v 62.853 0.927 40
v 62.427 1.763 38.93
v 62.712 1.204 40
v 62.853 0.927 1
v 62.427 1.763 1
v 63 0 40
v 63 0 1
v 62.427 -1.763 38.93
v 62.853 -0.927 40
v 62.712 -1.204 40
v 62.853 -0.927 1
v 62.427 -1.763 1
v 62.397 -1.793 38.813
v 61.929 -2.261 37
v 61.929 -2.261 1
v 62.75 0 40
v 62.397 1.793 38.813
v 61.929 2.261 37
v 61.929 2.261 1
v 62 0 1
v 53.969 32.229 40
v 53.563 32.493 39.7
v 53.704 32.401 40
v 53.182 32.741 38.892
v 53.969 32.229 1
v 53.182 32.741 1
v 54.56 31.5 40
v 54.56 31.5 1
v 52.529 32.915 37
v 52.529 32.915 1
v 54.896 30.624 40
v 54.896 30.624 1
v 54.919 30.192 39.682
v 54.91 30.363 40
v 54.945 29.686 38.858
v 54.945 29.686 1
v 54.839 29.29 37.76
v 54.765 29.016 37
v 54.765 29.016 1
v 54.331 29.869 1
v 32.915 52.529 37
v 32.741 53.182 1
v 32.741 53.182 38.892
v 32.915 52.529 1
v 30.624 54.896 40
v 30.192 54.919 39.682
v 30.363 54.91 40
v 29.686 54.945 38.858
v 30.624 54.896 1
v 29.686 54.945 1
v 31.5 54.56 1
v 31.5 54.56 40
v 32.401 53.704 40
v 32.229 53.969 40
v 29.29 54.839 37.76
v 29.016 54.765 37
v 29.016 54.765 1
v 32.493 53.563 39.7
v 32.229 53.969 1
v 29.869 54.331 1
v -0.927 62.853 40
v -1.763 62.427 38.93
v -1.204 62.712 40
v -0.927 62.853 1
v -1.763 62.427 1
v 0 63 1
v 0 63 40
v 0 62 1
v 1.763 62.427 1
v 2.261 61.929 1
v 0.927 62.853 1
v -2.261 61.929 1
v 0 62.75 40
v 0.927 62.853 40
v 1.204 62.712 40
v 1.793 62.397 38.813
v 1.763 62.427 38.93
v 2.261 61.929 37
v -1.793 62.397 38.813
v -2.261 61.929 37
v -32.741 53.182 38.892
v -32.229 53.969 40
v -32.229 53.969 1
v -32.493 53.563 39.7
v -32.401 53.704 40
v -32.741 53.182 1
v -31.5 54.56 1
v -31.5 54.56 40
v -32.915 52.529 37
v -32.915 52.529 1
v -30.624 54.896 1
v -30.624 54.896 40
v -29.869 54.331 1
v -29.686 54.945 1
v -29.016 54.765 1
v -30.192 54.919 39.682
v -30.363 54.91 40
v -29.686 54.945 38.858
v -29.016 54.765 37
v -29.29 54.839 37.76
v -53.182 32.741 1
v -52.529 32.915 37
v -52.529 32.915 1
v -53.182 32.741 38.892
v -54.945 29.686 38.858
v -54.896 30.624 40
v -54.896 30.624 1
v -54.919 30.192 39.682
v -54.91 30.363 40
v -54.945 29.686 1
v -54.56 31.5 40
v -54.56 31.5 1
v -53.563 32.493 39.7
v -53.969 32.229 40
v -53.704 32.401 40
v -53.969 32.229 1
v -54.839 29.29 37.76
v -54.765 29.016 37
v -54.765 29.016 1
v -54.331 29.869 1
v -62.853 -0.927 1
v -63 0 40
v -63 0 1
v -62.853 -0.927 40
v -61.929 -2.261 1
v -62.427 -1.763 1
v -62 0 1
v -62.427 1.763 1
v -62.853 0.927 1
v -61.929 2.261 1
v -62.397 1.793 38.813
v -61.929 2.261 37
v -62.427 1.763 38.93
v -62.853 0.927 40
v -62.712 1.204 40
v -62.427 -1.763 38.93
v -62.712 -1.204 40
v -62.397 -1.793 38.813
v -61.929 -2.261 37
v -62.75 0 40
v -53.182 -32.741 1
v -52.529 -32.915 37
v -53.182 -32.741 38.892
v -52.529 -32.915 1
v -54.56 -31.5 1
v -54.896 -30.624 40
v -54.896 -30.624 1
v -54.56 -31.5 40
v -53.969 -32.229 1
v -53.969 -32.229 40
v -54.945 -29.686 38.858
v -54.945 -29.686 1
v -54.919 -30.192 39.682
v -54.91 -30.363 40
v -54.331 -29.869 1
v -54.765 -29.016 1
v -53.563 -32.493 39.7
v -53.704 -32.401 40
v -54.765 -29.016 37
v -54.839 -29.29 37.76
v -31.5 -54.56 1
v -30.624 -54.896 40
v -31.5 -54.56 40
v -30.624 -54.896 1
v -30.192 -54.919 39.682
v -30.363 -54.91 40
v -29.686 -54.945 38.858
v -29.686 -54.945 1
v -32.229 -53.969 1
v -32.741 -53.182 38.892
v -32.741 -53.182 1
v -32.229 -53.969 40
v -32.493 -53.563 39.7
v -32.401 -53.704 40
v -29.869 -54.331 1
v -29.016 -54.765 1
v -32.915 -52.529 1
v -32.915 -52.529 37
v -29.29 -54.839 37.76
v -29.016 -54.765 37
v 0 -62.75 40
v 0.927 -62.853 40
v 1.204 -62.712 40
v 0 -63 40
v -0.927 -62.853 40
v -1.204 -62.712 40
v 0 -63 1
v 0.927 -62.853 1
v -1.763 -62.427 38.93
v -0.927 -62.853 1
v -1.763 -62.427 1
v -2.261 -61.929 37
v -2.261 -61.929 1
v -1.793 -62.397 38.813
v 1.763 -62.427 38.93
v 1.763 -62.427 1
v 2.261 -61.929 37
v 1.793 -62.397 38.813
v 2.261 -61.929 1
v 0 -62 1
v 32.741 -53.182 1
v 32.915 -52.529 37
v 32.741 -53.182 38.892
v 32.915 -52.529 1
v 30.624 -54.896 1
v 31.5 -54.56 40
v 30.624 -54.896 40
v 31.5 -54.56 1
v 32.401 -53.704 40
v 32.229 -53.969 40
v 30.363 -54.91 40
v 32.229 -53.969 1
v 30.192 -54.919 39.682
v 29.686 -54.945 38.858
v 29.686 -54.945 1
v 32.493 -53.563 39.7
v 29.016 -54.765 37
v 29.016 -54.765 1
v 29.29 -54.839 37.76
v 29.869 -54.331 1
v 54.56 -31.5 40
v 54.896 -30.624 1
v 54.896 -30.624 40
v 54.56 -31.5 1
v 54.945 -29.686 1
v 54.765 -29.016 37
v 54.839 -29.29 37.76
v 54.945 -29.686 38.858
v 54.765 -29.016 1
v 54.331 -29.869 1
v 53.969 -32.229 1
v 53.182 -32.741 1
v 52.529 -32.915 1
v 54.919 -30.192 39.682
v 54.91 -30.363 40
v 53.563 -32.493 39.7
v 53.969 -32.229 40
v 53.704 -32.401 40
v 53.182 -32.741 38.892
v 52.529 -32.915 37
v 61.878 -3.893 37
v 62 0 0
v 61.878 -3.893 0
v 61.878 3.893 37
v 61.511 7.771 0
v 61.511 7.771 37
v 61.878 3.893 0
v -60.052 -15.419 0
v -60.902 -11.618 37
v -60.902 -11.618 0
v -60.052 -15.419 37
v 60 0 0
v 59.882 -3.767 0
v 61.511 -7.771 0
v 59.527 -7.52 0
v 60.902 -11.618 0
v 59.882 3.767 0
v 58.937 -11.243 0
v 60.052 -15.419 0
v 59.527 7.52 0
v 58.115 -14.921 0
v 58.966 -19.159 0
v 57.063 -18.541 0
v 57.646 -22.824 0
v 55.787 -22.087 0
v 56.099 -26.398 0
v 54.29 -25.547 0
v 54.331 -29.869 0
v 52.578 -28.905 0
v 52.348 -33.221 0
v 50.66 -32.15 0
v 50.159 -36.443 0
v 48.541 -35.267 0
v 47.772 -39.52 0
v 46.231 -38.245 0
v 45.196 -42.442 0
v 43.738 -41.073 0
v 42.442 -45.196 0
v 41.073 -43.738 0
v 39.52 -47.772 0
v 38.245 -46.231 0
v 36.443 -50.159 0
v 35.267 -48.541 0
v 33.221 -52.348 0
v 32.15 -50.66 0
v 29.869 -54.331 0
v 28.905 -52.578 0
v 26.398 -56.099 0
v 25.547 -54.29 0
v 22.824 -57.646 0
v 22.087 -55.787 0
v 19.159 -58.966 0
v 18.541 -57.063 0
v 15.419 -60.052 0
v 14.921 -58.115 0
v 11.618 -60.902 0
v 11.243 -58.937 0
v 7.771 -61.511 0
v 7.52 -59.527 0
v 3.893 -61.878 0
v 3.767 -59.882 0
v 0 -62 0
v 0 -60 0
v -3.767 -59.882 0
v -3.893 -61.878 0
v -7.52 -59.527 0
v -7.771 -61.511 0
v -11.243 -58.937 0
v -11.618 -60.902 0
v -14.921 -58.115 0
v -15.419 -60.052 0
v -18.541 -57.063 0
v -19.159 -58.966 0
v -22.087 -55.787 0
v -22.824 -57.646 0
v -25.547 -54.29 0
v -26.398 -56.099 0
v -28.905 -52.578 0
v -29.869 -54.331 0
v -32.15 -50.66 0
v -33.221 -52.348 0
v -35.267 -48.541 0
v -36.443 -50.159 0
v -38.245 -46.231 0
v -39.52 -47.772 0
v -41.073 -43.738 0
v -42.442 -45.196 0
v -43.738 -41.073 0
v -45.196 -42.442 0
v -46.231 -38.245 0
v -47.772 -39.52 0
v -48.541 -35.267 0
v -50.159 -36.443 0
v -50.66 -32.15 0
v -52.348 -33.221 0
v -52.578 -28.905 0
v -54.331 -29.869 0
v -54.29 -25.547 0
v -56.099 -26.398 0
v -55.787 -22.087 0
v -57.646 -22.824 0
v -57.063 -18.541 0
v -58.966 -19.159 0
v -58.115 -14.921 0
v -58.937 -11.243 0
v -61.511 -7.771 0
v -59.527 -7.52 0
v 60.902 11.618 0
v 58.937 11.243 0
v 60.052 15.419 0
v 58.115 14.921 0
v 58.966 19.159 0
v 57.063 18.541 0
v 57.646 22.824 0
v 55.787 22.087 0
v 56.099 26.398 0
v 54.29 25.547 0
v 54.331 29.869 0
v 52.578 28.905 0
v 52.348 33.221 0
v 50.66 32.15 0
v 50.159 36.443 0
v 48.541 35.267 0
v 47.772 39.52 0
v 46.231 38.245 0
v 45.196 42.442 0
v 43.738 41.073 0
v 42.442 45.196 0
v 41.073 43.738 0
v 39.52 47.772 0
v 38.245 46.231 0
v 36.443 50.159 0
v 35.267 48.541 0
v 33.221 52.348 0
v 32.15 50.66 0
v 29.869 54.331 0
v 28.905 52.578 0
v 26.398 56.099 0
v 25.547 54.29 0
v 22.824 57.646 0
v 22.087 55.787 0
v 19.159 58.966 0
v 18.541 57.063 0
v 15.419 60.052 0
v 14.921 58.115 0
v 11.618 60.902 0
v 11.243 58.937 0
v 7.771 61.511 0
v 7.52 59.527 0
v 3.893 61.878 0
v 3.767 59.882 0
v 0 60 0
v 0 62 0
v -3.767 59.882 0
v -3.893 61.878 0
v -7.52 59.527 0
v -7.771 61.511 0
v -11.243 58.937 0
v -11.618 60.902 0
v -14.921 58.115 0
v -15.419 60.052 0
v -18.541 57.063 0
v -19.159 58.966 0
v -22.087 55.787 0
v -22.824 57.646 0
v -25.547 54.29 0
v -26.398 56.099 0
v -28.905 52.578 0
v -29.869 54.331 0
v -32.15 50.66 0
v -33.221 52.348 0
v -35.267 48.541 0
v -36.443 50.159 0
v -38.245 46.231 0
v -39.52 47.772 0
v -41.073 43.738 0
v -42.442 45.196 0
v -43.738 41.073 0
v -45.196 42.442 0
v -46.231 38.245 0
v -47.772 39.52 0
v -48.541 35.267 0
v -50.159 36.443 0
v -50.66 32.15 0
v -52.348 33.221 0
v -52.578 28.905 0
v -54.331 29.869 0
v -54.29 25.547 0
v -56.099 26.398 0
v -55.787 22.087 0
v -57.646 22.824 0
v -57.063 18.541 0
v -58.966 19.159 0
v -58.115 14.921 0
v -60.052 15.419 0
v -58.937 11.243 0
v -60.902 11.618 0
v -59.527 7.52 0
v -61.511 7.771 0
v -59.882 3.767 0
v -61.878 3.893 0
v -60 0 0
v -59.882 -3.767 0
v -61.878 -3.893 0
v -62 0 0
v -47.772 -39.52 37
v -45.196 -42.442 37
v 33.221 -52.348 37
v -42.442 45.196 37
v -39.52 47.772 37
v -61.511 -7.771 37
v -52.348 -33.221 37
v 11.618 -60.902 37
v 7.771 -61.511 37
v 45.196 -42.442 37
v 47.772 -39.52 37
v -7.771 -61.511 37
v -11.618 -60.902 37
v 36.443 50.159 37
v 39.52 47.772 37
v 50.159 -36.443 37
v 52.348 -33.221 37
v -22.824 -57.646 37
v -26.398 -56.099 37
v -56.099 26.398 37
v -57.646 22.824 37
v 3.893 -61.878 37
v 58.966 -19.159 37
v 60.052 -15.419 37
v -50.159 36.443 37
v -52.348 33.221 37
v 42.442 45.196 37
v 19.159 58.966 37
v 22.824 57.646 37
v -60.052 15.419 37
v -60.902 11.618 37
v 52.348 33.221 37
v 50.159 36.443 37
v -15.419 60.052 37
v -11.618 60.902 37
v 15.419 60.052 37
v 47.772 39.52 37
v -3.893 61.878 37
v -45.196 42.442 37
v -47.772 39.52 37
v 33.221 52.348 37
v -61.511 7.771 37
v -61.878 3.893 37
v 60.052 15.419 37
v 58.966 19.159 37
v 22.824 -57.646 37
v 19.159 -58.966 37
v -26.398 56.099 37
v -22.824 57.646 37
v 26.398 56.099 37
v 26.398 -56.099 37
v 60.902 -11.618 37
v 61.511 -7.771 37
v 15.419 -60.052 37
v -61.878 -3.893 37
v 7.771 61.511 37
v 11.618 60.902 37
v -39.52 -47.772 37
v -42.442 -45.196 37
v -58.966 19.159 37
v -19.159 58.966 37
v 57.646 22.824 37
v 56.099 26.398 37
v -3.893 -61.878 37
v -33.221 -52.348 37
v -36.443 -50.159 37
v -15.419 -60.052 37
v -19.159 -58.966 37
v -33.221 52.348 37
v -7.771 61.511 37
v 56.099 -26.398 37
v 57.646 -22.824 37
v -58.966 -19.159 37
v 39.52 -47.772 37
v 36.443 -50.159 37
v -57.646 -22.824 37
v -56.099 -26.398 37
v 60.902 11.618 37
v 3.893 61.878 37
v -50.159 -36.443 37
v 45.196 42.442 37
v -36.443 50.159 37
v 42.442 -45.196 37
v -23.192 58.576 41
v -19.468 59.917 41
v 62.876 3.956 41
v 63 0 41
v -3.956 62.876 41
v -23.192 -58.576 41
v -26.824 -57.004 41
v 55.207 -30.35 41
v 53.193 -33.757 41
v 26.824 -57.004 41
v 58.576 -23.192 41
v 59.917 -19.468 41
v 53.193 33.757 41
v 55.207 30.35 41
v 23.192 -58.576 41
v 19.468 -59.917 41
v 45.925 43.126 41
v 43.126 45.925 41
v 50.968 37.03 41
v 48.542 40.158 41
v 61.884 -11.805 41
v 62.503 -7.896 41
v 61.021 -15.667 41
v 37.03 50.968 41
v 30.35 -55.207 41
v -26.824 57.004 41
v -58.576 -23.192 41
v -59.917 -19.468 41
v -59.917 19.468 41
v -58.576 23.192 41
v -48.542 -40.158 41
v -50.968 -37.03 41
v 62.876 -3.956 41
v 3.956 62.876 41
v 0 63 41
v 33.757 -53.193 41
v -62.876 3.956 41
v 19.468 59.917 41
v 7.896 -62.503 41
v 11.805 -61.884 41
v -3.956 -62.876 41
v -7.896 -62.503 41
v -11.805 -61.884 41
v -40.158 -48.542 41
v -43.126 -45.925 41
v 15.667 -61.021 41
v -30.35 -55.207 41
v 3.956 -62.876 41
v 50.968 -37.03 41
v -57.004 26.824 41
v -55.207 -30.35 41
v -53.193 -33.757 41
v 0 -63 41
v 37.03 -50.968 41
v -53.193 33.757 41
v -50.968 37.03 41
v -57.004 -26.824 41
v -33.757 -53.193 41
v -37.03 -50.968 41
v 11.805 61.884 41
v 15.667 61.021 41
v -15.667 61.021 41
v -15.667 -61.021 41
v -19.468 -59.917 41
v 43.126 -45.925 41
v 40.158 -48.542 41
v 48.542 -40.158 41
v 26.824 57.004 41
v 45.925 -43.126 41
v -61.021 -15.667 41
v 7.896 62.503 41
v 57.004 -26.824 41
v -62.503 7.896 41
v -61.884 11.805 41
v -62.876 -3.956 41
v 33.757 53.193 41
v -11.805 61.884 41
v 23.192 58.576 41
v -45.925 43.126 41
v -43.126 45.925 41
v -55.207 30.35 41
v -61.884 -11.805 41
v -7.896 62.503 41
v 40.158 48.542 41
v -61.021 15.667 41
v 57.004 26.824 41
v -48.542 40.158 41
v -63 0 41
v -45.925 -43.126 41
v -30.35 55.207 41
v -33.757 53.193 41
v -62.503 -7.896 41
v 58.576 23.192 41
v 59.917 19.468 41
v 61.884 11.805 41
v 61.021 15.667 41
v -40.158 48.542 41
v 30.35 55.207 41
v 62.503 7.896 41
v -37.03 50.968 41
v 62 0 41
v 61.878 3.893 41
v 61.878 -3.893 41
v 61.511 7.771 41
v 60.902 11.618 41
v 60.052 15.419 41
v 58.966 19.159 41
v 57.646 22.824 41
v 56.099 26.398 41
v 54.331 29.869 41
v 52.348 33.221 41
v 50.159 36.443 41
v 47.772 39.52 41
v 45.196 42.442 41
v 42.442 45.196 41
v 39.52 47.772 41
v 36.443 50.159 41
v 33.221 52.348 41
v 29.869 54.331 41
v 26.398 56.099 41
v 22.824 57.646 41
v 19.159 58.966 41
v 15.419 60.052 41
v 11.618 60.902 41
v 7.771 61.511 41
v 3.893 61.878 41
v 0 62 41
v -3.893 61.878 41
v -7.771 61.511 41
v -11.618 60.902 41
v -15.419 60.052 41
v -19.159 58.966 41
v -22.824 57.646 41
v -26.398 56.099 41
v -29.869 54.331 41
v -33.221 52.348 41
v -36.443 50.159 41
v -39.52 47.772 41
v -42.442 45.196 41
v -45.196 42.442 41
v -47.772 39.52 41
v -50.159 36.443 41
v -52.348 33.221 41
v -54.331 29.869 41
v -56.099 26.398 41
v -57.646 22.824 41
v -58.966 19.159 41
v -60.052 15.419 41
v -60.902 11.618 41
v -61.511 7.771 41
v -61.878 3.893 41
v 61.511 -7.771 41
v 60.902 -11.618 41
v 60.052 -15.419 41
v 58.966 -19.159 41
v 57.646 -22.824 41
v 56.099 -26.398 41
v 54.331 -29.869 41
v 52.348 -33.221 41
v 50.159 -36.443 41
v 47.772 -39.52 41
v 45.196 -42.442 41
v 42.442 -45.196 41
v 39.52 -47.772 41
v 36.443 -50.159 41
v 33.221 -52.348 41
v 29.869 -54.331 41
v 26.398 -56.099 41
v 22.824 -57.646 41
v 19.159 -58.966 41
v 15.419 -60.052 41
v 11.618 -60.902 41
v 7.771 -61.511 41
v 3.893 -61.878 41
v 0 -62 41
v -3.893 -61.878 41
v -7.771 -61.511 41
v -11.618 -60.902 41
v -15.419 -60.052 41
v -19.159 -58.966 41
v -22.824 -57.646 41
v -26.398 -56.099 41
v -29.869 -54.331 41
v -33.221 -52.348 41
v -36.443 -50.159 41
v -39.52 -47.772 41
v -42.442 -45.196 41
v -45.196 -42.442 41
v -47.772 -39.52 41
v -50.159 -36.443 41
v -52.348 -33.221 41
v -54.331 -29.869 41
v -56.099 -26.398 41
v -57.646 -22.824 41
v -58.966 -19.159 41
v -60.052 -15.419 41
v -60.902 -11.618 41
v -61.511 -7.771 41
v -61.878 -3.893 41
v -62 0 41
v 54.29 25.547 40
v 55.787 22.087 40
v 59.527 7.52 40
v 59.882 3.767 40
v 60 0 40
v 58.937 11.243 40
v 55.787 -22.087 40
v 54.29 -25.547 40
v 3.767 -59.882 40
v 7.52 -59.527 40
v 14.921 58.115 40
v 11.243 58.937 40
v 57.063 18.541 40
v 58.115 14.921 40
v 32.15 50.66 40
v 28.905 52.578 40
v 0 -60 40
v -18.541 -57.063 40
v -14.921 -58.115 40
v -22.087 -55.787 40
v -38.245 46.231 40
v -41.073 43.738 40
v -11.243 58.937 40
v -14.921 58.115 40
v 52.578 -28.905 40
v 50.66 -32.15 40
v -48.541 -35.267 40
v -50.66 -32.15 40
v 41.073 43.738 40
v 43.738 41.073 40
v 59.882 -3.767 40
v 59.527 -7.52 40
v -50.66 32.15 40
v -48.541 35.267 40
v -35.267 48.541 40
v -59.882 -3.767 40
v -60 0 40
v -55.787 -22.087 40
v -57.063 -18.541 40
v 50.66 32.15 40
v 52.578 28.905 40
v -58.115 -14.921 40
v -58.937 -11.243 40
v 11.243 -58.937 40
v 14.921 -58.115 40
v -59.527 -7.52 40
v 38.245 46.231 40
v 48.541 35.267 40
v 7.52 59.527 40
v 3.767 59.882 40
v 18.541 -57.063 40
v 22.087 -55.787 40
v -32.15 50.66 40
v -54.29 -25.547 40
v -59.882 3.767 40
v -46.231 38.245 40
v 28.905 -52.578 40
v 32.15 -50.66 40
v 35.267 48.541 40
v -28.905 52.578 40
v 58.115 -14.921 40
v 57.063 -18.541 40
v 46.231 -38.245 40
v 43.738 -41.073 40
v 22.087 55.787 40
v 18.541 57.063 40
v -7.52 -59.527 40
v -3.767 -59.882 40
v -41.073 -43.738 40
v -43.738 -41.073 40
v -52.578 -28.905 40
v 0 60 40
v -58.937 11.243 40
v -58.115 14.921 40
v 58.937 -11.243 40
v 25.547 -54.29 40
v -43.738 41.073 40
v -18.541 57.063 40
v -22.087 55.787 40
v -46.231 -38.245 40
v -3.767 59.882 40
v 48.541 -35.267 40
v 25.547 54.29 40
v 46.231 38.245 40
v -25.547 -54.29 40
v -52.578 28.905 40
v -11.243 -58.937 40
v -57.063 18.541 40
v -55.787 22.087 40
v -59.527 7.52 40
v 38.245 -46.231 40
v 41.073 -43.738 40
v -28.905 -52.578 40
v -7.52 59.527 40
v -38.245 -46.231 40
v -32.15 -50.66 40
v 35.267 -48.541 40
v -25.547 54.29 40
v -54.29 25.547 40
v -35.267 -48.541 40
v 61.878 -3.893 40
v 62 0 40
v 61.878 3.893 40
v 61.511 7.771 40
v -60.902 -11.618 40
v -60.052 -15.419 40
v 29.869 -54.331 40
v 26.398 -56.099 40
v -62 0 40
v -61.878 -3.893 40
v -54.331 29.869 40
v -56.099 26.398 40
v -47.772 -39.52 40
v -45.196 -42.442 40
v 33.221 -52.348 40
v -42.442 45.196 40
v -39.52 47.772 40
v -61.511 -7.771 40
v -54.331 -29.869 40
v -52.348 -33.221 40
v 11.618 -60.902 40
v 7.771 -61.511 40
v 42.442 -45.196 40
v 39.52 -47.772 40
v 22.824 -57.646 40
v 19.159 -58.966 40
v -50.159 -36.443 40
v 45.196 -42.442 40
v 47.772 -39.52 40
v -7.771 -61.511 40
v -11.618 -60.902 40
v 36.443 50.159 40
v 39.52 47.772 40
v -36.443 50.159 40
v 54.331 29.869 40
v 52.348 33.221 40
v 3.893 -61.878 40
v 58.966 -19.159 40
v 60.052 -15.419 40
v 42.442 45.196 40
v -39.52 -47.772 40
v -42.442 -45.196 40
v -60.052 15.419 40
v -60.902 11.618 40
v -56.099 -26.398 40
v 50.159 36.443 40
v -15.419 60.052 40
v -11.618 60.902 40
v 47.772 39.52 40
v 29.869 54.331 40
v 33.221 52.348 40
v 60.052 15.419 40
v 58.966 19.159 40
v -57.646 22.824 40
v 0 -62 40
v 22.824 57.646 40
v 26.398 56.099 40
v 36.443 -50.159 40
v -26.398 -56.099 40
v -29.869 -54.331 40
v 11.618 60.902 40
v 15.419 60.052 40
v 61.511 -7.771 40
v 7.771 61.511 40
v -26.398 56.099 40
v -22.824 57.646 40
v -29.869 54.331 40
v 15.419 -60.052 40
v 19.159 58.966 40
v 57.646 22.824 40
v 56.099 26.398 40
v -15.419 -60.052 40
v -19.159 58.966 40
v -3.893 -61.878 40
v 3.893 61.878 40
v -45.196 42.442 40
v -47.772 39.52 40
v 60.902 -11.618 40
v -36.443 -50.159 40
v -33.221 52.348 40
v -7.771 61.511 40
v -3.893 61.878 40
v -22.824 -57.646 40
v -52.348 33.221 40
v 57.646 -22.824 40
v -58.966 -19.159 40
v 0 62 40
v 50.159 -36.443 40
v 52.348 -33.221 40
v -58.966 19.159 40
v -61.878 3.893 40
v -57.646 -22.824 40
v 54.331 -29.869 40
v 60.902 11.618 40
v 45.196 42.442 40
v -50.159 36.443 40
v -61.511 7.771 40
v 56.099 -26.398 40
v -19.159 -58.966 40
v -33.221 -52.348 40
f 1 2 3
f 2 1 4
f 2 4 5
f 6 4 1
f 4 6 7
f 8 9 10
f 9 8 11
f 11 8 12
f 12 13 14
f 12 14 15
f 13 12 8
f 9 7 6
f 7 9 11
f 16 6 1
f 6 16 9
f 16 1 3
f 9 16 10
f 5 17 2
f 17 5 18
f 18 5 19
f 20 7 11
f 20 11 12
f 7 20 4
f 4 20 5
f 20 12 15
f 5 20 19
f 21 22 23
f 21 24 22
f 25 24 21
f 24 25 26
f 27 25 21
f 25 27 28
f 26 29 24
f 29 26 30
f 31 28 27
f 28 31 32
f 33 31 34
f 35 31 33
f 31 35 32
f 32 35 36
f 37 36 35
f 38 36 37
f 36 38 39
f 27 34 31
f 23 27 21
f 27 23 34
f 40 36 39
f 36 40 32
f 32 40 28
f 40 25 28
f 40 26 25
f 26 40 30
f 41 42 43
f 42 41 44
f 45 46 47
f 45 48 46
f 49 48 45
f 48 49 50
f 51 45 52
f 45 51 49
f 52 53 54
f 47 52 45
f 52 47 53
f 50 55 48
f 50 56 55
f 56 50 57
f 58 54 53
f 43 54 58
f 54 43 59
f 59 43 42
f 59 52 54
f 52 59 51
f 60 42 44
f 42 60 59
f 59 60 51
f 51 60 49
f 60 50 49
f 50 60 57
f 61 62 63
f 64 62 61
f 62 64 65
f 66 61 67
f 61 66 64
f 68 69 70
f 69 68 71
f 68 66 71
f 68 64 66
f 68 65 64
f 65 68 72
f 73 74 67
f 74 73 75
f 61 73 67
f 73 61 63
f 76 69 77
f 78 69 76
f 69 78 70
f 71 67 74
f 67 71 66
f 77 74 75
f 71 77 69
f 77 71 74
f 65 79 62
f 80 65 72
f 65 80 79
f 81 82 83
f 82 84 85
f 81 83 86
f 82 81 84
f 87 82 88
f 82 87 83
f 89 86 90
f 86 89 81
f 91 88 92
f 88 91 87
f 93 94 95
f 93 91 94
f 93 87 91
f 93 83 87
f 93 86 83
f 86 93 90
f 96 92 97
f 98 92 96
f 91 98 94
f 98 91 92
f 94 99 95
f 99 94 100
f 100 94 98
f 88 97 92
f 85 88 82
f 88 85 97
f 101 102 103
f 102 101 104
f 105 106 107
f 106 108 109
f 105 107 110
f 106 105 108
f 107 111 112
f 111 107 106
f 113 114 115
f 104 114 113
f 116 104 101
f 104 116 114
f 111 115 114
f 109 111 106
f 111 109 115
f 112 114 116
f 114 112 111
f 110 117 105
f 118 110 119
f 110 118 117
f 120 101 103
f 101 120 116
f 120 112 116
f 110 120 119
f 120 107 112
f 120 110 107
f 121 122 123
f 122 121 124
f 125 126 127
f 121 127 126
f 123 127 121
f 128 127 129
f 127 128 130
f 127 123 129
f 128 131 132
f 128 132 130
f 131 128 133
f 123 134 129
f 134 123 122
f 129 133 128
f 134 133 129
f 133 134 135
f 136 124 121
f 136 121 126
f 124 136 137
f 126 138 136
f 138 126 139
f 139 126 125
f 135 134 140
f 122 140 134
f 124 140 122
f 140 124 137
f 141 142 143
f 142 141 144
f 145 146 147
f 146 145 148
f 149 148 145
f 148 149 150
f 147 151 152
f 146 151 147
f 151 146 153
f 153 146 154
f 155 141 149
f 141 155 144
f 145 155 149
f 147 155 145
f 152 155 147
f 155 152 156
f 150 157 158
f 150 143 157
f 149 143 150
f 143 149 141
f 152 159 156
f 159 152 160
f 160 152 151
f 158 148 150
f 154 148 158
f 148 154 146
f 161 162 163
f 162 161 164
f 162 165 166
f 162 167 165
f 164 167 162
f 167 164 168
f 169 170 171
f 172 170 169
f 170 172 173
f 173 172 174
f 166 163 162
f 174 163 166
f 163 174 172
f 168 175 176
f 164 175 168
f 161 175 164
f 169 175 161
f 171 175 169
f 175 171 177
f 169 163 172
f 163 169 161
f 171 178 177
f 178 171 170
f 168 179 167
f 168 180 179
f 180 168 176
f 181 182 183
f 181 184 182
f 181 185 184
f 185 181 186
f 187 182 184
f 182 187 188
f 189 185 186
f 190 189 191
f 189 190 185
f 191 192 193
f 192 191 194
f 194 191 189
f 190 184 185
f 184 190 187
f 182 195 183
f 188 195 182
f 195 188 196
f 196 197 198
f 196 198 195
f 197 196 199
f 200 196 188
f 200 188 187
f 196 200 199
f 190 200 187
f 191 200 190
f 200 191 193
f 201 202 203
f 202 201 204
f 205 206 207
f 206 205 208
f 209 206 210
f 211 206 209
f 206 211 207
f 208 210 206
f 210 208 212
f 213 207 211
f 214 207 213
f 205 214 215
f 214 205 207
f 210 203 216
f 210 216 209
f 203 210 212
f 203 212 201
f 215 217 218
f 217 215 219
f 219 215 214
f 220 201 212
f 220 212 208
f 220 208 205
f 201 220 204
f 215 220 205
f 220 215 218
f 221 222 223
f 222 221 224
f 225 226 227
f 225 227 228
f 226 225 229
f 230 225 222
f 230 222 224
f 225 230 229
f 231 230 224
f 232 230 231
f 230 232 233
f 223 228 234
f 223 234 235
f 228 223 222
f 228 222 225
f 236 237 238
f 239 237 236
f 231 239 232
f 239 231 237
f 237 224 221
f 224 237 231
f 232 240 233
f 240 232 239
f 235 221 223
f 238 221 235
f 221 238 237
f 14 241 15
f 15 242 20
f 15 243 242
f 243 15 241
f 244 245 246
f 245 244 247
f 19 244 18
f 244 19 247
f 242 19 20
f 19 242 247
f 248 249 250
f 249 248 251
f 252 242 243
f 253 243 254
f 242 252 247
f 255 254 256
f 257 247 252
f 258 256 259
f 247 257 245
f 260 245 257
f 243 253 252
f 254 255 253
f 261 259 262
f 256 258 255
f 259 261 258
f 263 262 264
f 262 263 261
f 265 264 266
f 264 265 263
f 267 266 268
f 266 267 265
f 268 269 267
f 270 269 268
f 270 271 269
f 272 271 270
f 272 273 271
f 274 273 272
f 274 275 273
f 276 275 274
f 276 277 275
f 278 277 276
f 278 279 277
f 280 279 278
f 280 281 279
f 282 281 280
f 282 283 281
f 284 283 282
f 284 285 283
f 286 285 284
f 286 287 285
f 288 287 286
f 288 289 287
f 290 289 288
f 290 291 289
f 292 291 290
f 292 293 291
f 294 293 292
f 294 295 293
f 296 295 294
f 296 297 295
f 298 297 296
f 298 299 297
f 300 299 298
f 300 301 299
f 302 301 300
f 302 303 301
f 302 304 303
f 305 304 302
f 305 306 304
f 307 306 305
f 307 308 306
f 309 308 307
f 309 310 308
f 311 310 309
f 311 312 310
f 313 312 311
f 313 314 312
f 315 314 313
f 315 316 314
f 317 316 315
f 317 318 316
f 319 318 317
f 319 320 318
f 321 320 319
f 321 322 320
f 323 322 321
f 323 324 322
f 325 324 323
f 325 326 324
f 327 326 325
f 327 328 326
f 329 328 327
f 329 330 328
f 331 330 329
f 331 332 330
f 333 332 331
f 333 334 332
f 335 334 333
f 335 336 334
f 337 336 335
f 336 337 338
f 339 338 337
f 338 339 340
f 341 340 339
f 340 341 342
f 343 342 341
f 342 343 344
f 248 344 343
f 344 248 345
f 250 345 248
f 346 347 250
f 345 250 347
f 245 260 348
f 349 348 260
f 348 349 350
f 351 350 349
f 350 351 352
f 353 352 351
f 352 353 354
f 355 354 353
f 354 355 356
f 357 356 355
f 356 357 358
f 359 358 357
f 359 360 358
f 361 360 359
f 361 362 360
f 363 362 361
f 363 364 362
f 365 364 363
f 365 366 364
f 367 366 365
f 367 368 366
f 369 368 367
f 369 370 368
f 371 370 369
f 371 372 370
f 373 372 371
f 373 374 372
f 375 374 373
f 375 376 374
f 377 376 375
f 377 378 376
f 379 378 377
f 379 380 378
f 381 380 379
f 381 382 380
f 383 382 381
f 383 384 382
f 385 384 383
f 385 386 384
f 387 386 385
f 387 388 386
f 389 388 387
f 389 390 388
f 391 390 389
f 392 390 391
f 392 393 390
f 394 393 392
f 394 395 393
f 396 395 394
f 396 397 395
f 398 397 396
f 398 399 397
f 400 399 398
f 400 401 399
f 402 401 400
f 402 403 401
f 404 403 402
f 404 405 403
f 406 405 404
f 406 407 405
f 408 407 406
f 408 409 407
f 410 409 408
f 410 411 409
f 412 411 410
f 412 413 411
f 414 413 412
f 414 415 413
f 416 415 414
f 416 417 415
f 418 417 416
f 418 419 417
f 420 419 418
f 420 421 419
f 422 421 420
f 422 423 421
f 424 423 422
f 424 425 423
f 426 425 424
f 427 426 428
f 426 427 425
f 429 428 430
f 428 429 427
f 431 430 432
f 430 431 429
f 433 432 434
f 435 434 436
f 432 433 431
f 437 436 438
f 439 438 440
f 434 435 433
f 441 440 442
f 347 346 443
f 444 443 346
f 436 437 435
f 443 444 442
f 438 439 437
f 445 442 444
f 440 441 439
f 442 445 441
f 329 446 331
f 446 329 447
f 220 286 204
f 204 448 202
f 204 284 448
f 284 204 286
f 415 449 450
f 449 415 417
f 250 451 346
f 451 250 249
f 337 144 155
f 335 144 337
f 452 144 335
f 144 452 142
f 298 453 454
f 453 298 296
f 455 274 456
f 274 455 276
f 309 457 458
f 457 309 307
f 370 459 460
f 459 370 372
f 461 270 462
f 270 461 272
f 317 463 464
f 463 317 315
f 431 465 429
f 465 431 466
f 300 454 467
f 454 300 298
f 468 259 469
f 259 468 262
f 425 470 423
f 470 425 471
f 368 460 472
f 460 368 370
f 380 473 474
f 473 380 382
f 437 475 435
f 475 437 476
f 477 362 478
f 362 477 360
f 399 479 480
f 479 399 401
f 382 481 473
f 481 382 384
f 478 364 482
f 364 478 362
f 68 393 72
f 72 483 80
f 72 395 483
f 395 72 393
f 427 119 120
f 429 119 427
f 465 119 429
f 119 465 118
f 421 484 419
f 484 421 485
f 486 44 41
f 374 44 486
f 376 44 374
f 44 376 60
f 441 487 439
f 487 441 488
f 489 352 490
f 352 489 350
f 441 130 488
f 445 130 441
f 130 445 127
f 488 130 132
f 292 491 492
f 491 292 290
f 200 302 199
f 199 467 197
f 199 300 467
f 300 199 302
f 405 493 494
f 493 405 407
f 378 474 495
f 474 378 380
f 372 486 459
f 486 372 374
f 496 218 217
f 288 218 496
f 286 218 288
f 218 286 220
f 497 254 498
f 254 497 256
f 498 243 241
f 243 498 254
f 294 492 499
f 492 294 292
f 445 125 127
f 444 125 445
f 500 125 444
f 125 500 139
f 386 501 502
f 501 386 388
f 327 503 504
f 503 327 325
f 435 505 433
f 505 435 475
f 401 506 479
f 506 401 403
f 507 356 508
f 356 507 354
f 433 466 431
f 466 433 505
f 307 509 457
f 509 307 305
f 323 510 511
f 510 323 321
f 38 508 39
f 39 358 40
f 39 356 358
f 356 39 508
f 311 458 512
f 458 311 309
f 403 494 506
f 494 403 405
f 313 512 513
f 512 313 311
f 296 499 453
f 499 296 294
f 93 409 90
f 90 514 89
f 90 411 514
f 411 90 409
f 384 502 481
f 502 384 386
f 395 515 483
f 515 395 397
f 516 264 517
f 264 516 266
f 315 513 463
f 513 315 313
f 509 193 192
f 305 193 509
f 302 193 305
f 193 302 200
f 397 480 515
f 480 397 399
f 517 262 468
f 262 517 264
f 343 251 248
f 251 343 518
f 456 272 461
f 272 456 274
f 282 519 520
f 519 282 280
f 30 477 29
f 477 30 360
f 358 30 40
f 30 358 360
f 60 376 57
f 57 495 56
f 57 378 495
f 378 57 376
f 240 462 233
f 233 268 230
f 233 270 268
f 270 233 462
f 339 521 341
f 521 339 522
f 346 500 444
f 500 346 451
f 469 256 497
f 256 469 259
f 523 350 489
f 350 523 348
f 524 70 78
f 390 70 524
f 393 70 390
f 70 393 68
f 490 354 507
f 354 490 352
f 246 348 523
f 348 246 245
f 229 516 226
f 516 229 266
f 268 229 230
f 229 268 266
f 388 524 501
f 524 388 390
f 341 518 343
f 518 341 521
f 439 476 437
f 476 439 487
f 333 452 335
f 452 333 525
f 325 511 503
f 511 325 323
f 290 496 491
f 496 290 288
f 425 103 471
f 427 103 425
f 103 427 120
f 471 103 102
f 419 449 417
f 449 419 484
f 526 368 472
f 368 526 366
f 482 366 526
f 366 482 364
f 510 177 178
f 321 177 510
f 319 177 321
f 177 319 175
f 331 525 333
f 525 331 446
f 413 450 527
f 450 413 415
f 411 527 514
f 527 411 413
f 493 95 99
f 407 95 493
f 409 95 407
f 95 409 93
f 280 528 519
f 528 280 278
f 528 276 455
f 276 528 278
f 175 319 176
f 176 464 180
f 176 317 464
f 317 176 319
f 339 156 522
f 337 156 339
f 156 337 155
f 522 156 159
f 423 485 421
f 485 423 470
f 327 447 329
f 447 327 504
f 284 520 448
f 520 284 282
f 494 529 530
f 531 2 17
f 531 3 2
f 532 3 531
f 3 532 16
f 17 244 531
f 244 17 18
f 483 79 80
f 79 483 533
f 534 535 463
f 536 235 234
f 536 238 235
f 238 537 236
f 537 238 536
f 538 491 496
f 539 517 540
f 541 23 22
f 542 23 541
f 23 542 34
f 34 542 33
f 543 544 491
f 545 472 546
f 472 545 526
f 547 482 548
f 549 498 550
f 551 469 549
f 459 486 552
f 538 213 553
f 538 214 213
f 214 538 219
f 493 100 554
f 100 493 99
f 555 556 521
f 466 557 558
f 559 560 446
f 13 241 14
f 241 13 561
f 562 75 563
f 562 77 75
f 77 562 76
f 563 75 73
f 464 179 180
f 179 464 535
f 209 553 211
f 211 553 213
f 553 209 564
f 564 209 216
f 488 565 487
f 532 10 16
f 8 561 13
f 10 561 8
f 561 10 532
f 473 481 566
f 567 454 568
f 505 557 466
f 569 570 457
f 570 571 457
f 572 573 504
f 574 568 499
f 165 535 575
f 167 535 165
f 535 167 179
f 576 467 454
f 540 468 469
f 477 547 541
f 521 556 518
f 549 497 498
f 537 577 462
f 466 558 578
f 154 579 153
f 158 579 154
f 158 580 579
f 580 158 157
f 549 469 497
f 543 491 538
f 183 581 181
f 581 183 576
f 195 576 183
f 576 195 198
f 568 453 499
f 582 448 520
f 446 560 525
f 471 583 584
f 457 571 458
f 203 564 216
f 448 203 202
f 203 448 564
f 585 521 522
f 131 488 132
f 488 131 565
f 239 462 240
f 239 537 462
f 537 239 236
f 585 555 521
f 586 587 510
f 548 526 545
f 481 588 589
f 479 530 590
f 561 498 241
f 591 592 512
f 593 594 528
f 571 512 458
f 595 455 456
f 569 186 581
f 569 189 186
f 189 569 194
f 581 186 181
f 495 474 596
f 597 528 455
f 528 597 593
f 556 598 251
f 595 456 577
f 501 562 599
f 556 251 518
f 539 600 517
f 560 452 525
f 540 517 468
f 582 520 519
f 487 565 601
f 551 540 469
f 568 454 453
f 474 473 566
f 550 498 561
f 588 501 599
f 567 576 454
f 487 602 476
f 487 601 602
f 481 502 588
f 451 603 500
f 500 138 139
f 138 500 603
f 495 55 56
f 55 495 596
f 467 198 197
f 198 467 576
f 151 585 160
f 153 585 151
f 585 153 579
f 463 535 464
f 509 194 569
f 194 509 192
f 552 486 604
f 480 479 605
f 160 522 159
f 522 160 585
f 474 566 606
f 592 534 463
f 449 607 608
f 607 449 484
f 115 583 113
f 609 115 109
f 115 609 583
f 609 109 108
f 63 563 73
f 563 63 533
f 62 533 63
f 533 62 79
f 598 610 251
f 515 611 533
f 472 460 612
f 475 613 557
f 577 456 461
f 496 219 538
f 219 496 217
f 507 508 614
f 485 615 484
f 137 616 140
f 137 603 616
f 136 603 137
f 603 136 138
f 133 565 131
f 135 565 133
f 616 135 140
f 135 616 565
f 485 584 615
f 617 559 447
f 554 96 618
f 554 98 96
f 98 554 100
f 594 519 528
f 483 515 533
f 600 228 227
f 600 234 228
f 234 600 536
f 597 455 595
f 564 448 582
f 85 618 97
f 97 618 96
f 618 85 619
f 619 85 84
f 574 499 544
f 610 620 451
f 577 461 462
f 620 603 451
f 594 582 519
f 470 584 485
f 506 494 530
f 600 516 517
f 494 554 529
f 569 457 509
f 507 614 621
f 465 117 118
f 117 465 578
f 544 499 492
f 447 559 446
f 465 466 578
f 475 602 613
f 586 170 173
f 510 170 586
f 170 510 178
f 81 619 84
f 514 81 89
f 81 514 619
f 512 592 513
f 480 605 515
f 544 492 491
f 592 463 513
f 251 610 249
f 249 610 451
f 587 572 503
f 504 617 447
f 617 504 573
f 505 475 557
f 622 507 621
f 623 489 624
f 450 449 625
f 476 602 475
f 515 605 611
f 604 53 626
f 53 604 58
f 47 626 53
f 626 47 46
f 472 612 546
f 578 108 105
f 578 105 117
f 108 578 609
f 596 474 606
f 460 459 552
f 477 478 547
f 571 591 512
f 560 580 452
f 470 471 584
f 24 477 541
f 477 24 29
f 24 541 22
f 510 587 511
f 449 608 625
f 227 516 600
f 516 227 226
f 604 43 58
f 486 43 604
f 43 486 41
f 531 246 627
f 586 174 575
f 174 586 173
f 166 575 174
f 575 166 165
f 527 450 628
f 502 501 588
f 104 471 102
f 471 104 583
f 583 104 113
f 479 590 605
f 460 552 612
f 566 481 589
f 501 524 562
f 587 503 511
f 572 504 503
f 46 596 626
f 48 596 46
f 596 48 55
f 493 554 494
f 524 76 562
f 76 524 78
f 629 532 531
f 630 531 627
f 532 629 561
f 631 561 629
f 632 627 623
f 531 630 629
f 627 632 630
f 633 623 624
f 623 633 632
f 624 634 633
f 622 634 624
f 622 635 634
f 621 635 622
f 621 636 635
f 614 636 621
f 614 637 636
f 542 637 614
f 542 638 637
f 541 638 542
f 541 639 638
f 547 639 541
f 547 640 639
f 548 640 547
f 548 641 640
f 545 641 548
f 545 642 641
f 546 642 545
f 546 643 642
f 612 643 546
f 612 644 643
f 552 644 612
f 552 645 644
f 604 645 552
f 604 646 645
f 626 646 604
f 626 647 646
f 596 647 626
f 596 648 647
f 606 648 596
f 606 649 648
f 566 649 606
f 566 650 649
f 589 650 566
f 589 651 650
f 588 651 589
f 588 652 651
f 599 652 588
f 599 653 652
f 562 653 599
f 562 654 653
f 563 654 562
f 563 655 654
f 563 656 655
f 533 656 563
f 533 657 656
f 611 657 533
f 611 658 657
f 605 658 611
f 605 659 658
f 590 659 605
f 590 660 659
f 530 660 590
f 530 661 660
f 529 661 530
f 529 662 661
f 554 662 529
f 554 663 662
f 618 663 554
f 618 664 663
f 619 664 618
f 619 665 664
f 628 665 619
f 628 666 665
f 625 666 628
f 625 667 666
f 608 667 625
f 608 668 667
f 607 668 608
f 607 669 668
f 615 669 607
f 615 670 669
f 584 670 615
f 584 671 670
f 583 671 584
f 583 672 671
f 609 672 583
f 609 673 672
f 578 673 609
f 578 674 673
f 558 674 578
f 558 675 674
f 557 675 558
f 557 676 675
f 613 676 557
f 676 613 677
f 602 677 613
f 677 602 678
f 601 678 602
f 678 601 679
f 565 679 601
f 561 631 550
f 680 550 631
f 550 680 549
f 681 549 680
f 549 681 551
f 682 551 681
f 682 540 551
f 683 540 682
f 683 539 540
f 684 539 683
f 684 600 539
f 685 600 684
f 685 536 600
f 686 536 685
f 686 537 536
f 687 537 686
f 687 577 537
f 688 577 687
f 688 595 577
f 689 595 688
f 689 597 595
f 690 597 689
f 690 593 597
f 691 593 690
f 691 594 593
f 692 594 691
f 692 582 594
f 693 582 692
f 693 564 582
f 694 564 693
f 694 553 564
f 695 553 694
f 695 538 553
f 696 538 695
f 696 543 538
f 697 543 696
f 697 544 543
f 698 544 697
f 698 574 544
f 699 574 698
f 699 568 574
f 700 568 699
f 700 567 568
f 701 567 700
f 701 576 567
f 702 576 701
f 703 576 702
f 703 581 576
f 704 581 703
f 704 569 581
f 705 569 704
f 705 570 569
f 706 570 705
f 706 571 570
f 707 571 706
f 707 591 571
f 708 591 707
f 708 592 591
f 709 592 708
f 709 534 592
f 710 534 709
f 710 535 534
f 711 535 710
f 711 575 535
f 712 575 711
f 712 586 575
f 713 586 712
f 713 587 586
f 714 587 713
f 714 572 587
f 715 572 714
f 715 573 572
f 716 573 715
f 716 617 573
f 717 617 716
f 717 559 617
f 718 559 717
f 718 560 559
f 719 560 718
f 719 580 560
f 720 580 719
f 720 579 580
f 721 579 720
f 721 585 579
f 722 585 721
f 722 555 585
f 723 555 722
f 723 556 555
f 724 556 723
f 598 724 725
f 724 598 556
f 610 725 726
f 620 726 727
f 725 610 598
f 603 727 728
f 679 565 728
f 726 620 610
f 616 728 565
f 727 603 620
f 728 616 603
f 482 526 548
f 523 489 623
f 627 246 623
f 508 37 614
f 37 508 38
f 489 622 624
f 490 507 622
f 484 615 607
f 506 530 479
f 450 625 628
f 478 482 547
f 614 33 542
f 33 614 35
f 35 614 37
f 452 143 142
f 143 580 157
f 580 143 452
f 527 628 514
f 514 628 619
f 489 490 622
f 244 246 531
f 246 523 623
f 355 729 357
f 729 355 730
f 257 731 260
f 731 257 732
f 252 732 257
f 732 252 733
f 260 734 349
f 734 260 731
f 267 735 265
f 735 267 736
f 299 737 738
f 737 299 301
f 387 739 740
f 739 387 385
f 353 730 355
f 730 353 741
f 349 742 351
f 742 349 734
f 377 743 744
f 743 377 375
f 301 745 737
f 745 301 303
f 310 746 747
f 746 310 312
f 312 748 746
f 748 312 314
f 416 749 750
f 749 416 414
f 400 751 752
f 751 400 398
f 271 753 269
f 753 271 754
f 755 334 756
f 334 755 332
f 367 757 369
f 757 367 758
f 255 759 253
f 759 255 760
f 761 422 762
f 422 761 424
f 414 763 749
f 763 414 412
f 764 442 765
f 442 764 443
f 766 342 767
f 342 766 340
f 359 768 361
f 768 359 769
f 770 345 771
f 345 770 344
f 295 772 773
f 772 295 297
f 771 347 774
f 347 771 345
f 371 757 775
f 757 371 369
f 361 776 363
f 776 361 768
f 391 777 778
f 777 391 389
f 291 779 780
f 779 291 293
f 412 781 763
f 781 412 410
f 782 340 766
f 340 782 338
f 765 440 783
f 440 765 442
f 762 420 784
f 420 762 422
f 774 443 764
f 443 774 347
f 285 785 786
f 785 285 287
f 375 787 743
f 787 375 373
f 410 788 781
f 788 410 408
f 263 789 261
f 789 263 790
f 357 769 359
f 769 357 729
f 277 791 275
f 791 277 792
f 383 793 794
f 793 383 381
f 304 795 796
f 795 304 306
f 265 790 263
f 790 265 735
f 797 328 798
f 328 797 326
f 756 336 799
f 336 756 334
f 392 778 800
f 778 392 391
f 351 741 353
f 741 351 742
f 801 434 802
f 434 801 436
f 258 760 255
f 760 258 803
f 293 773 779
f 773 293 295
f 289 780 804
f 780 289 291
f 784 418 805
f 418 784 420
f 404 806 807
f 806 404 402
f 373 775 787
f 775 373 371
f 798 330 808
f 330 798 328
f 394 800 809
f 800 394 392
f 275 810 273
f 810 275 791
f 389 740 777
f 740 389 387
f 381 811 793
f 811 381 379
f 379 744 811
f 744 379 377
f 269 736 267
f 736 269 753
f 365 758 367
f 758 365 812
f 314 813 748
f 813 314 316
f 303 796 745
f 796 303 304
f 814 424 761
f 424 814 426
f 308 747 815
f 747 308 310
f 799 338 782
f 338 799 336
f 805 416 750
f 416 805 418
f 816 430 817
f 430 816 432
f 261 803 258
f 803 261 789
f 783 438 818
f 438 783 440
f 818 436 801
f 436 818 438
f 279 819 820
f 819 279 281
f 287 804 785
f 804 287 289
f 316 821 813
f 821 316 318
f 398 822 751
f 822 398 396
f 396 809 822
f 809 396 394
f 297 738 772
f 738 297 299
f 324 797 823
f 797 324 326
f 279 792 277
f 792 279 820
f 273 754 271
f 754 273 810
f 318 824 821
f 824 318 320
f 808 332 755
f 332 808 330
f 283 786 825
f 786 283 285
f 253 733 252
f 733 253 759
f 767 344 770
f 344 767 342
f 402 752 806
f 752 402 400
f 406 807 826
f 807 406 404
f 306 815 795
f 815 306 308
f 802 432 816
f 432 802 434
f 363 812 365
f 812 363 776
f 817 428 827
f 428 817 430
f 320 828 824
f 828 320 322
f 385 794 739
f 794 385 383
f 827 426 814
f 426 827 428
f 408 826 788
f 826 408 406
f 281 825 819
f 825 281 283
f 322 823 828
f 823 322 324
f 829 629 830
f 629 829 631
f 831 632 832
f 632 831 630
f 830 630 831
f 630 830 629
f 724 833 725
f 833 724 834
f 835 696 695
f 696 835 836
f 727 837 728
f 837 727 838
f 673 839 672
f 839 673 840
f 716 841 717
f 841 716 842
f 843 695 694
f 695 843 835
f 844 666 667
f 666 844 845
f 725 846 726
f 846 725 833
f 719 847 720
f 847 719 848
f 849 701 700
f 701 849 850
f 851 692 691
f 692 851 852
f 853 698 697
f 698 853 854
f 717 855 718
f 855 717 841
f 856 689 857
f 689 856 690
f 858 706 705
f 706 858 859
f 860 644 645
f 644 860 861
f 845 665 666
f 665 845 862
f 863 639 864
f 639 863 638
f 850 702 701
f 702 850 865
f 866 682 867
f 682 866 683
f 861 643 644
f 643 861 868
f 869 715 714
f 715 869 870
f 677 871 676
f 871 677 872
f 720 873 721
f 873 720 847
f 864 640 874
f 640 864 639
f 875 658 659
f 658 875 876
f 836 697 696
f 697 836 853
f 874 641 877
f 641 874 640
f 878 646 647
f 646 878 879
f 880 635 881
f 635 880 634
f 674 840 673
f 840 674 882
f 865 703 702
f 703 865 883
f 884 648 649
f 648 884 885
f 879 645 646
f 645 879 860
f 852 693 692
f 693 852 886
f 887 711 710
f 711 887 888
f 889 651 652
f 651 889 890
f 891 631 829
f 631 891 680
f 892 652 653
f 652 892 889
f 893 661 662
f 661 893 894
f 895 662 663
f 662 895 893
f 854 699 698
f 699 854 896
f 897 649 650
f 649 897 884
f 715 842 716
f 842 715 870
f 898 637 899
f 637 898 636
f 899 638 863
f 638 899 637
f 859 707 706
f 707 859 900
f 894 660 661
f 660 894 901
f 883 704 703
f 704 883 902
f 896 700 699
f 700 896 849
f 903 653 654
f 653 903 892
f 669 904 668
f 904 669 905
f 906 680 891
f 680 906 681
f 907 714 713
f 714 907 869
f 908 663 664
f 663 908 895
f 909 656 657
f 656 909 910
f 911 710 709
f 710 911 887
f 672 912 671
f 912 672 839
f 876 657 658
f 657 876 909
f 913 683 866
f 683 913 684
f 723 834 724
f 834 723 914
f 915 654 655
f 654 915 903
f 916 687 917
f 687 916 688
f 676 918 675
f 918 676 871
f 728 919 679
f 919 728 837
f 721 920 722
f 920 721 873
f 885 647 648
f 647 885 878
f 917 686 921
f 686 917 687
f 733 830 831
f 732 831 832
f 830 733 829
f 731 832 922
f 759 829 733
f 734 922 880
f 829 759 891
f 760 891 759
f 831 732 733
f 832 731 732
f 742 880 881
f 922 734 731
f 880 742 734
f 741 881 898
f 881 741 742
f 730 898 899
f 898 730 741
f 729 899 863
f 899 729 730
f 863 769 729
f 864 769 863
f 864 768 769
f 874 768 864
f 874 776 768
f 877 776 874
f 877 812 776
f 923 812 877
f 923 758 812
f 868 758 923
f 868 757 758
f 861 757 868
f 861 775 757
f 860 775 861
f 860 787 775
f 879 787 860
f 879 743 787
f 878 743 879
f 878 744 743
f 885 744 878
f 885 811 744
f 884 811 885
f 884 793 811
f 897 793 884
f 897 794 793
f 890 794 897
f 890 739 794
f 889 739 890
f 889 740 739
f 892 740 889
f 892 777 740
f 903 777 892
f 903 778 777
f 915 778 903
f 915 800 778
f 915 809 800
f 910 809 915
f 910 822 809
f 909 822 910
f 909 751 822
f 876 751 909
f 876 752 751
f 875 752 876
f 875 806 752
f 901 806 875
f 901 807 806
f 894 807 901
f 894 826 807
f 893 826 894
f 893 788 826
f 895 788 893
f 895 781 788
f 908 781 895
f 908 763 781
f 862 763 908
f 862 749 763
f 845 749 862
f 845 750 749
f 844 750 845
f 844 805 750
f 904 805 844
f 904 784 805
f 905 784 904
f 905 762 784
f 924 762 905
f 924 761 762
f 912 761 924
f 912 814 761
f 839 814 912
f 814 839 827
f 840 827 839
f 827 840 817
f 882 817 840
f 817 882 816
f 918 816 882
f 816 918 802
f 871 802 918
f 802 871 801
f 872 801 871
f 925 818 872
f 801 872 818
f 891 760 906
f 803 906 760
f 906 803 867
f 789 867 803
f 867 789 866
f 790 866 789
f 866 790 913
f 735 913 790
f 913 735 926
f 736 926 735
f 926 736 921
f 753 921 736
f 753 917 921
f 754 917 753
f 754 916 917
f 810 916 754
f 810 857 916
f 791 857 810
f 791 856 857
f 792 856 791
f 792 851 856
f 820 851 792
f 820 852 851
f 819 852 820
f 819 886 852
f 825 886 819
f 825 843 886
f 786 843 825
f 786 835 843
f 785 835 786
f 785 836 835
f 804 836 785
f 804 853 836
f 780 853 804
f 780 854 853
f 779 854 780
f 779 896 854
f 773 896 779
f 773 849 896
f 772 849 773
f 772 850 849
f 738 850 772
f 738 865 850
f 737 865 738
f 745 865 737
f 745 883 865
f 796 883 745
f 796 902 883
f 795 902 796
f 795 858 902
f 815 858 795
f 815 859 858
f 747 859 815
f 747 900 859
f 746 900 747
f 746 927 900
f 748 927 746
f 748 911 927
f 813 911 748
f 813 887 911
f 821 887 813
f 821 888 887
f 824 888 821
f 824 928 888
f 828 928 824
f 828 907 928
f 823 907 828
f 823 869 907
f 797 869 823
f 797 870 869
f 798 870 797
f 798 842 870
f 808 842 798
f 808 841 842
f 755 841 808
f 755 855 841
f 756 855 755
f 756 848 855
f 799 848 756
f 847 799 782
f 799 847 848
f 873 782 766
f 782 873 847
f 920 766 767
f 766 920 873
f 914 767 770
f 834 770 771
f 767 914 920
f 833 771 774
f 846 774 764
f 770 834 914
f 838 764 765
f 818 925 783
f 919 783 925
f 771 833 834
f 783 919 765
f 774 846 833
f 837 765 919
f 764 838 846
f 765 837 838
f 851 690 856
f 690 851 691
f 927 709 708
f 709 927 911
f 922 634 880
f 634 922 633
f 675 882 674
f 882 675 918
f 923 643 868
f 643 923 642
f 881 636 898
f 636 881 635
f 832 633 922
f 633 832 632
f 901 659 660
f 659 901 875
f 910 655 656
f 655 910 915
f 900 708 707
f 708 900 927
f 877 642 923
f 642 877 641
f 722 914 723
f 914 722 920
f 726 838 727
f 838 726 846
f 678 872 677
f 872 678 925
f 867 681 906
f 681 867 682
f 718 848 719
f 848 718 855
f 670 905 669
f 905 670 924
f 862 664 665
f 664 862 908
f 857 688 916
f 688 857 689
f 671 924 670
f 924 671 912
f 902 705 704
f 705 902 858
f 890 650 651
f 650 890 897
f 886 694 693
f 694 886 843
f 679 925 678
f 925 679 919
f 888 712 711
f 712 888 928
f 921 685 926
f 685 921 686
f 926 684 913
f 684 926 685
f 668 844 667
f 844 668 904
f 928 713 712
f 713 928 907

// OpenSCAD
// file: poddispenser_common.scad
/* ************************************************************************** */
// global variables
// dispenser [inner] radius: the dispenser is cylindrical ...
// thickness of most walls and structures
/* ************************************************************************** */

g_dispenser_radius=60;
g_wallthickness=2;

/* ************************************************************************** */
// definitions for the VMA401 stepper motor
// motorheight is the height of the vma401 stepper motor, all the way to the useful part of the axle
// motoroffset is how offcenter the vma401 axle is
// motordia is the diameter of the vma401 motor
/* ************************************************************************** */

g_motorheight=23;
g_motordia=28;
g_motoroffset=7;
g_motorflapdepth=3;

/* ************************************************************************** */
// definitions for axle bearing
/* ************************************************************************** */

g_bearingheight=7;
g_bearingdia=22;

/* ************************************************************************** */
/* cutout for capsule viewed sideways. This cutout is comfortably larger      */
/* than needed to pass the capsule                                            */
/* ************************************************************************** */

module capsule_cutout() {
    polygon(points=[[-20,0],[20,0],[20,3],[15,4],[13,26],[5,35],[-5,35],[-13,26],[-15,4],[-20,3]]);
}

/* ************************************************************************** */
/* a 2mm wide wall around the cutout                                          */
/* ************************************************************************** */

module capsule_cutout_outer() {
    polygon(points=[[-22,-2],[22,-2],[22,5],[17,6],[15,28],[7,37],[1,37],[1,47],[-1,47],[-1,37],[-7,37],[-15,28],[-17,6],[-22,5]]);
}

/* ************************************************************************** */
/* ************************************************************************** */

module capsule_cutout_widebrim() {
    polygon(points=[[-20,-5],[20,-5],[20,3],[15,4],[13,26],[5,35],[-5,35],[-13,26],[-15,4],[-20,3]]);
}

/* ************************************************************************** */
// inner + outer capsule, open at the end
/* ************************************************************************** */

module capsule_outline_open() {
    polygon(points=[[20,0],[20,3],[15,4],[13,26],[5,35],
                            [-5,35],[-13,26],[-15,4],[-20,3],[-20,-2],
                            [-22,-2],[-22,5],[-17,6],[-15,28],[-7,37],
                            [-1,37],[-1,65],[1,65],[1,37],
                            [7,37],[15,28],[17,6],[22,5],[22,-2],[20,-2]]);
    
    
}

/* ************************************************************************** */
/* rimmed outer wall around object.
/* ************************************************************************** */

module rimmedwall(wallheight=60, radius=g_dispenser_radius) {
    difference() {
        union() {
            cylinder($fn=100,r=radius+g_wallthickness,h=wallheight);
            translate([0,0,wallheight-3]) cylinder($fn=100,r1=radius+g_wallthickness,r2=radius+g_wallthickness+1,h=4);
	    // ridges on the wall to improve printing
	    for (angle=[0:30:360])
	        rotate([0,0,angle])
	            translate([radius, 0, 1])
		        cylinder($fn=20,r=g_wallthickness+1,h=wallheight-1);
        }
        union() {
            translate([0,0,-1]) cylinder($fn=100,r=radius,h=wallheight+3);
            translate([0,0,wallheight]) cylinder($fn=100,r=radius+g_wallthickness,h=3);
        }
    }
}

/* ************************************************************************** */
// bearing seat
/* ************************************************************************** */

module bearingholder_plus() {
    cylinder($fn=30,r=g_bearingdia/2+3,h=g_bearingheight+2);
}

/* ************************************************************************** */
/* bearing cutout
/* ************************************************************************** */
module bearingholder_minus() {
     translate([0,0,g_wallthickness]) cylinder($fn=40,r=g_bearingdia/2+0.1,h=g_bearingheight+1);
}



/* ************************************************************************** */
/* a pair of object that leave holes for screws on the axle */
/* ************************************************************************** */

module screw_cone_plus() {
    cylinder($fn=40,r1=17,r2=10,h=9);
}

module screw_cone_minus() {
    translate([0,0,1]) cylinder($fn=40,r1=15,r2=8,h=6);
    cylinder($fn=50,r=15,h=1);
}
// main file
use <poddispenser_common.scad>


// wall around holder
module poddispenser_wall() {
   rimmedwall(wallheight=40);
}

poddispenser_wall();
